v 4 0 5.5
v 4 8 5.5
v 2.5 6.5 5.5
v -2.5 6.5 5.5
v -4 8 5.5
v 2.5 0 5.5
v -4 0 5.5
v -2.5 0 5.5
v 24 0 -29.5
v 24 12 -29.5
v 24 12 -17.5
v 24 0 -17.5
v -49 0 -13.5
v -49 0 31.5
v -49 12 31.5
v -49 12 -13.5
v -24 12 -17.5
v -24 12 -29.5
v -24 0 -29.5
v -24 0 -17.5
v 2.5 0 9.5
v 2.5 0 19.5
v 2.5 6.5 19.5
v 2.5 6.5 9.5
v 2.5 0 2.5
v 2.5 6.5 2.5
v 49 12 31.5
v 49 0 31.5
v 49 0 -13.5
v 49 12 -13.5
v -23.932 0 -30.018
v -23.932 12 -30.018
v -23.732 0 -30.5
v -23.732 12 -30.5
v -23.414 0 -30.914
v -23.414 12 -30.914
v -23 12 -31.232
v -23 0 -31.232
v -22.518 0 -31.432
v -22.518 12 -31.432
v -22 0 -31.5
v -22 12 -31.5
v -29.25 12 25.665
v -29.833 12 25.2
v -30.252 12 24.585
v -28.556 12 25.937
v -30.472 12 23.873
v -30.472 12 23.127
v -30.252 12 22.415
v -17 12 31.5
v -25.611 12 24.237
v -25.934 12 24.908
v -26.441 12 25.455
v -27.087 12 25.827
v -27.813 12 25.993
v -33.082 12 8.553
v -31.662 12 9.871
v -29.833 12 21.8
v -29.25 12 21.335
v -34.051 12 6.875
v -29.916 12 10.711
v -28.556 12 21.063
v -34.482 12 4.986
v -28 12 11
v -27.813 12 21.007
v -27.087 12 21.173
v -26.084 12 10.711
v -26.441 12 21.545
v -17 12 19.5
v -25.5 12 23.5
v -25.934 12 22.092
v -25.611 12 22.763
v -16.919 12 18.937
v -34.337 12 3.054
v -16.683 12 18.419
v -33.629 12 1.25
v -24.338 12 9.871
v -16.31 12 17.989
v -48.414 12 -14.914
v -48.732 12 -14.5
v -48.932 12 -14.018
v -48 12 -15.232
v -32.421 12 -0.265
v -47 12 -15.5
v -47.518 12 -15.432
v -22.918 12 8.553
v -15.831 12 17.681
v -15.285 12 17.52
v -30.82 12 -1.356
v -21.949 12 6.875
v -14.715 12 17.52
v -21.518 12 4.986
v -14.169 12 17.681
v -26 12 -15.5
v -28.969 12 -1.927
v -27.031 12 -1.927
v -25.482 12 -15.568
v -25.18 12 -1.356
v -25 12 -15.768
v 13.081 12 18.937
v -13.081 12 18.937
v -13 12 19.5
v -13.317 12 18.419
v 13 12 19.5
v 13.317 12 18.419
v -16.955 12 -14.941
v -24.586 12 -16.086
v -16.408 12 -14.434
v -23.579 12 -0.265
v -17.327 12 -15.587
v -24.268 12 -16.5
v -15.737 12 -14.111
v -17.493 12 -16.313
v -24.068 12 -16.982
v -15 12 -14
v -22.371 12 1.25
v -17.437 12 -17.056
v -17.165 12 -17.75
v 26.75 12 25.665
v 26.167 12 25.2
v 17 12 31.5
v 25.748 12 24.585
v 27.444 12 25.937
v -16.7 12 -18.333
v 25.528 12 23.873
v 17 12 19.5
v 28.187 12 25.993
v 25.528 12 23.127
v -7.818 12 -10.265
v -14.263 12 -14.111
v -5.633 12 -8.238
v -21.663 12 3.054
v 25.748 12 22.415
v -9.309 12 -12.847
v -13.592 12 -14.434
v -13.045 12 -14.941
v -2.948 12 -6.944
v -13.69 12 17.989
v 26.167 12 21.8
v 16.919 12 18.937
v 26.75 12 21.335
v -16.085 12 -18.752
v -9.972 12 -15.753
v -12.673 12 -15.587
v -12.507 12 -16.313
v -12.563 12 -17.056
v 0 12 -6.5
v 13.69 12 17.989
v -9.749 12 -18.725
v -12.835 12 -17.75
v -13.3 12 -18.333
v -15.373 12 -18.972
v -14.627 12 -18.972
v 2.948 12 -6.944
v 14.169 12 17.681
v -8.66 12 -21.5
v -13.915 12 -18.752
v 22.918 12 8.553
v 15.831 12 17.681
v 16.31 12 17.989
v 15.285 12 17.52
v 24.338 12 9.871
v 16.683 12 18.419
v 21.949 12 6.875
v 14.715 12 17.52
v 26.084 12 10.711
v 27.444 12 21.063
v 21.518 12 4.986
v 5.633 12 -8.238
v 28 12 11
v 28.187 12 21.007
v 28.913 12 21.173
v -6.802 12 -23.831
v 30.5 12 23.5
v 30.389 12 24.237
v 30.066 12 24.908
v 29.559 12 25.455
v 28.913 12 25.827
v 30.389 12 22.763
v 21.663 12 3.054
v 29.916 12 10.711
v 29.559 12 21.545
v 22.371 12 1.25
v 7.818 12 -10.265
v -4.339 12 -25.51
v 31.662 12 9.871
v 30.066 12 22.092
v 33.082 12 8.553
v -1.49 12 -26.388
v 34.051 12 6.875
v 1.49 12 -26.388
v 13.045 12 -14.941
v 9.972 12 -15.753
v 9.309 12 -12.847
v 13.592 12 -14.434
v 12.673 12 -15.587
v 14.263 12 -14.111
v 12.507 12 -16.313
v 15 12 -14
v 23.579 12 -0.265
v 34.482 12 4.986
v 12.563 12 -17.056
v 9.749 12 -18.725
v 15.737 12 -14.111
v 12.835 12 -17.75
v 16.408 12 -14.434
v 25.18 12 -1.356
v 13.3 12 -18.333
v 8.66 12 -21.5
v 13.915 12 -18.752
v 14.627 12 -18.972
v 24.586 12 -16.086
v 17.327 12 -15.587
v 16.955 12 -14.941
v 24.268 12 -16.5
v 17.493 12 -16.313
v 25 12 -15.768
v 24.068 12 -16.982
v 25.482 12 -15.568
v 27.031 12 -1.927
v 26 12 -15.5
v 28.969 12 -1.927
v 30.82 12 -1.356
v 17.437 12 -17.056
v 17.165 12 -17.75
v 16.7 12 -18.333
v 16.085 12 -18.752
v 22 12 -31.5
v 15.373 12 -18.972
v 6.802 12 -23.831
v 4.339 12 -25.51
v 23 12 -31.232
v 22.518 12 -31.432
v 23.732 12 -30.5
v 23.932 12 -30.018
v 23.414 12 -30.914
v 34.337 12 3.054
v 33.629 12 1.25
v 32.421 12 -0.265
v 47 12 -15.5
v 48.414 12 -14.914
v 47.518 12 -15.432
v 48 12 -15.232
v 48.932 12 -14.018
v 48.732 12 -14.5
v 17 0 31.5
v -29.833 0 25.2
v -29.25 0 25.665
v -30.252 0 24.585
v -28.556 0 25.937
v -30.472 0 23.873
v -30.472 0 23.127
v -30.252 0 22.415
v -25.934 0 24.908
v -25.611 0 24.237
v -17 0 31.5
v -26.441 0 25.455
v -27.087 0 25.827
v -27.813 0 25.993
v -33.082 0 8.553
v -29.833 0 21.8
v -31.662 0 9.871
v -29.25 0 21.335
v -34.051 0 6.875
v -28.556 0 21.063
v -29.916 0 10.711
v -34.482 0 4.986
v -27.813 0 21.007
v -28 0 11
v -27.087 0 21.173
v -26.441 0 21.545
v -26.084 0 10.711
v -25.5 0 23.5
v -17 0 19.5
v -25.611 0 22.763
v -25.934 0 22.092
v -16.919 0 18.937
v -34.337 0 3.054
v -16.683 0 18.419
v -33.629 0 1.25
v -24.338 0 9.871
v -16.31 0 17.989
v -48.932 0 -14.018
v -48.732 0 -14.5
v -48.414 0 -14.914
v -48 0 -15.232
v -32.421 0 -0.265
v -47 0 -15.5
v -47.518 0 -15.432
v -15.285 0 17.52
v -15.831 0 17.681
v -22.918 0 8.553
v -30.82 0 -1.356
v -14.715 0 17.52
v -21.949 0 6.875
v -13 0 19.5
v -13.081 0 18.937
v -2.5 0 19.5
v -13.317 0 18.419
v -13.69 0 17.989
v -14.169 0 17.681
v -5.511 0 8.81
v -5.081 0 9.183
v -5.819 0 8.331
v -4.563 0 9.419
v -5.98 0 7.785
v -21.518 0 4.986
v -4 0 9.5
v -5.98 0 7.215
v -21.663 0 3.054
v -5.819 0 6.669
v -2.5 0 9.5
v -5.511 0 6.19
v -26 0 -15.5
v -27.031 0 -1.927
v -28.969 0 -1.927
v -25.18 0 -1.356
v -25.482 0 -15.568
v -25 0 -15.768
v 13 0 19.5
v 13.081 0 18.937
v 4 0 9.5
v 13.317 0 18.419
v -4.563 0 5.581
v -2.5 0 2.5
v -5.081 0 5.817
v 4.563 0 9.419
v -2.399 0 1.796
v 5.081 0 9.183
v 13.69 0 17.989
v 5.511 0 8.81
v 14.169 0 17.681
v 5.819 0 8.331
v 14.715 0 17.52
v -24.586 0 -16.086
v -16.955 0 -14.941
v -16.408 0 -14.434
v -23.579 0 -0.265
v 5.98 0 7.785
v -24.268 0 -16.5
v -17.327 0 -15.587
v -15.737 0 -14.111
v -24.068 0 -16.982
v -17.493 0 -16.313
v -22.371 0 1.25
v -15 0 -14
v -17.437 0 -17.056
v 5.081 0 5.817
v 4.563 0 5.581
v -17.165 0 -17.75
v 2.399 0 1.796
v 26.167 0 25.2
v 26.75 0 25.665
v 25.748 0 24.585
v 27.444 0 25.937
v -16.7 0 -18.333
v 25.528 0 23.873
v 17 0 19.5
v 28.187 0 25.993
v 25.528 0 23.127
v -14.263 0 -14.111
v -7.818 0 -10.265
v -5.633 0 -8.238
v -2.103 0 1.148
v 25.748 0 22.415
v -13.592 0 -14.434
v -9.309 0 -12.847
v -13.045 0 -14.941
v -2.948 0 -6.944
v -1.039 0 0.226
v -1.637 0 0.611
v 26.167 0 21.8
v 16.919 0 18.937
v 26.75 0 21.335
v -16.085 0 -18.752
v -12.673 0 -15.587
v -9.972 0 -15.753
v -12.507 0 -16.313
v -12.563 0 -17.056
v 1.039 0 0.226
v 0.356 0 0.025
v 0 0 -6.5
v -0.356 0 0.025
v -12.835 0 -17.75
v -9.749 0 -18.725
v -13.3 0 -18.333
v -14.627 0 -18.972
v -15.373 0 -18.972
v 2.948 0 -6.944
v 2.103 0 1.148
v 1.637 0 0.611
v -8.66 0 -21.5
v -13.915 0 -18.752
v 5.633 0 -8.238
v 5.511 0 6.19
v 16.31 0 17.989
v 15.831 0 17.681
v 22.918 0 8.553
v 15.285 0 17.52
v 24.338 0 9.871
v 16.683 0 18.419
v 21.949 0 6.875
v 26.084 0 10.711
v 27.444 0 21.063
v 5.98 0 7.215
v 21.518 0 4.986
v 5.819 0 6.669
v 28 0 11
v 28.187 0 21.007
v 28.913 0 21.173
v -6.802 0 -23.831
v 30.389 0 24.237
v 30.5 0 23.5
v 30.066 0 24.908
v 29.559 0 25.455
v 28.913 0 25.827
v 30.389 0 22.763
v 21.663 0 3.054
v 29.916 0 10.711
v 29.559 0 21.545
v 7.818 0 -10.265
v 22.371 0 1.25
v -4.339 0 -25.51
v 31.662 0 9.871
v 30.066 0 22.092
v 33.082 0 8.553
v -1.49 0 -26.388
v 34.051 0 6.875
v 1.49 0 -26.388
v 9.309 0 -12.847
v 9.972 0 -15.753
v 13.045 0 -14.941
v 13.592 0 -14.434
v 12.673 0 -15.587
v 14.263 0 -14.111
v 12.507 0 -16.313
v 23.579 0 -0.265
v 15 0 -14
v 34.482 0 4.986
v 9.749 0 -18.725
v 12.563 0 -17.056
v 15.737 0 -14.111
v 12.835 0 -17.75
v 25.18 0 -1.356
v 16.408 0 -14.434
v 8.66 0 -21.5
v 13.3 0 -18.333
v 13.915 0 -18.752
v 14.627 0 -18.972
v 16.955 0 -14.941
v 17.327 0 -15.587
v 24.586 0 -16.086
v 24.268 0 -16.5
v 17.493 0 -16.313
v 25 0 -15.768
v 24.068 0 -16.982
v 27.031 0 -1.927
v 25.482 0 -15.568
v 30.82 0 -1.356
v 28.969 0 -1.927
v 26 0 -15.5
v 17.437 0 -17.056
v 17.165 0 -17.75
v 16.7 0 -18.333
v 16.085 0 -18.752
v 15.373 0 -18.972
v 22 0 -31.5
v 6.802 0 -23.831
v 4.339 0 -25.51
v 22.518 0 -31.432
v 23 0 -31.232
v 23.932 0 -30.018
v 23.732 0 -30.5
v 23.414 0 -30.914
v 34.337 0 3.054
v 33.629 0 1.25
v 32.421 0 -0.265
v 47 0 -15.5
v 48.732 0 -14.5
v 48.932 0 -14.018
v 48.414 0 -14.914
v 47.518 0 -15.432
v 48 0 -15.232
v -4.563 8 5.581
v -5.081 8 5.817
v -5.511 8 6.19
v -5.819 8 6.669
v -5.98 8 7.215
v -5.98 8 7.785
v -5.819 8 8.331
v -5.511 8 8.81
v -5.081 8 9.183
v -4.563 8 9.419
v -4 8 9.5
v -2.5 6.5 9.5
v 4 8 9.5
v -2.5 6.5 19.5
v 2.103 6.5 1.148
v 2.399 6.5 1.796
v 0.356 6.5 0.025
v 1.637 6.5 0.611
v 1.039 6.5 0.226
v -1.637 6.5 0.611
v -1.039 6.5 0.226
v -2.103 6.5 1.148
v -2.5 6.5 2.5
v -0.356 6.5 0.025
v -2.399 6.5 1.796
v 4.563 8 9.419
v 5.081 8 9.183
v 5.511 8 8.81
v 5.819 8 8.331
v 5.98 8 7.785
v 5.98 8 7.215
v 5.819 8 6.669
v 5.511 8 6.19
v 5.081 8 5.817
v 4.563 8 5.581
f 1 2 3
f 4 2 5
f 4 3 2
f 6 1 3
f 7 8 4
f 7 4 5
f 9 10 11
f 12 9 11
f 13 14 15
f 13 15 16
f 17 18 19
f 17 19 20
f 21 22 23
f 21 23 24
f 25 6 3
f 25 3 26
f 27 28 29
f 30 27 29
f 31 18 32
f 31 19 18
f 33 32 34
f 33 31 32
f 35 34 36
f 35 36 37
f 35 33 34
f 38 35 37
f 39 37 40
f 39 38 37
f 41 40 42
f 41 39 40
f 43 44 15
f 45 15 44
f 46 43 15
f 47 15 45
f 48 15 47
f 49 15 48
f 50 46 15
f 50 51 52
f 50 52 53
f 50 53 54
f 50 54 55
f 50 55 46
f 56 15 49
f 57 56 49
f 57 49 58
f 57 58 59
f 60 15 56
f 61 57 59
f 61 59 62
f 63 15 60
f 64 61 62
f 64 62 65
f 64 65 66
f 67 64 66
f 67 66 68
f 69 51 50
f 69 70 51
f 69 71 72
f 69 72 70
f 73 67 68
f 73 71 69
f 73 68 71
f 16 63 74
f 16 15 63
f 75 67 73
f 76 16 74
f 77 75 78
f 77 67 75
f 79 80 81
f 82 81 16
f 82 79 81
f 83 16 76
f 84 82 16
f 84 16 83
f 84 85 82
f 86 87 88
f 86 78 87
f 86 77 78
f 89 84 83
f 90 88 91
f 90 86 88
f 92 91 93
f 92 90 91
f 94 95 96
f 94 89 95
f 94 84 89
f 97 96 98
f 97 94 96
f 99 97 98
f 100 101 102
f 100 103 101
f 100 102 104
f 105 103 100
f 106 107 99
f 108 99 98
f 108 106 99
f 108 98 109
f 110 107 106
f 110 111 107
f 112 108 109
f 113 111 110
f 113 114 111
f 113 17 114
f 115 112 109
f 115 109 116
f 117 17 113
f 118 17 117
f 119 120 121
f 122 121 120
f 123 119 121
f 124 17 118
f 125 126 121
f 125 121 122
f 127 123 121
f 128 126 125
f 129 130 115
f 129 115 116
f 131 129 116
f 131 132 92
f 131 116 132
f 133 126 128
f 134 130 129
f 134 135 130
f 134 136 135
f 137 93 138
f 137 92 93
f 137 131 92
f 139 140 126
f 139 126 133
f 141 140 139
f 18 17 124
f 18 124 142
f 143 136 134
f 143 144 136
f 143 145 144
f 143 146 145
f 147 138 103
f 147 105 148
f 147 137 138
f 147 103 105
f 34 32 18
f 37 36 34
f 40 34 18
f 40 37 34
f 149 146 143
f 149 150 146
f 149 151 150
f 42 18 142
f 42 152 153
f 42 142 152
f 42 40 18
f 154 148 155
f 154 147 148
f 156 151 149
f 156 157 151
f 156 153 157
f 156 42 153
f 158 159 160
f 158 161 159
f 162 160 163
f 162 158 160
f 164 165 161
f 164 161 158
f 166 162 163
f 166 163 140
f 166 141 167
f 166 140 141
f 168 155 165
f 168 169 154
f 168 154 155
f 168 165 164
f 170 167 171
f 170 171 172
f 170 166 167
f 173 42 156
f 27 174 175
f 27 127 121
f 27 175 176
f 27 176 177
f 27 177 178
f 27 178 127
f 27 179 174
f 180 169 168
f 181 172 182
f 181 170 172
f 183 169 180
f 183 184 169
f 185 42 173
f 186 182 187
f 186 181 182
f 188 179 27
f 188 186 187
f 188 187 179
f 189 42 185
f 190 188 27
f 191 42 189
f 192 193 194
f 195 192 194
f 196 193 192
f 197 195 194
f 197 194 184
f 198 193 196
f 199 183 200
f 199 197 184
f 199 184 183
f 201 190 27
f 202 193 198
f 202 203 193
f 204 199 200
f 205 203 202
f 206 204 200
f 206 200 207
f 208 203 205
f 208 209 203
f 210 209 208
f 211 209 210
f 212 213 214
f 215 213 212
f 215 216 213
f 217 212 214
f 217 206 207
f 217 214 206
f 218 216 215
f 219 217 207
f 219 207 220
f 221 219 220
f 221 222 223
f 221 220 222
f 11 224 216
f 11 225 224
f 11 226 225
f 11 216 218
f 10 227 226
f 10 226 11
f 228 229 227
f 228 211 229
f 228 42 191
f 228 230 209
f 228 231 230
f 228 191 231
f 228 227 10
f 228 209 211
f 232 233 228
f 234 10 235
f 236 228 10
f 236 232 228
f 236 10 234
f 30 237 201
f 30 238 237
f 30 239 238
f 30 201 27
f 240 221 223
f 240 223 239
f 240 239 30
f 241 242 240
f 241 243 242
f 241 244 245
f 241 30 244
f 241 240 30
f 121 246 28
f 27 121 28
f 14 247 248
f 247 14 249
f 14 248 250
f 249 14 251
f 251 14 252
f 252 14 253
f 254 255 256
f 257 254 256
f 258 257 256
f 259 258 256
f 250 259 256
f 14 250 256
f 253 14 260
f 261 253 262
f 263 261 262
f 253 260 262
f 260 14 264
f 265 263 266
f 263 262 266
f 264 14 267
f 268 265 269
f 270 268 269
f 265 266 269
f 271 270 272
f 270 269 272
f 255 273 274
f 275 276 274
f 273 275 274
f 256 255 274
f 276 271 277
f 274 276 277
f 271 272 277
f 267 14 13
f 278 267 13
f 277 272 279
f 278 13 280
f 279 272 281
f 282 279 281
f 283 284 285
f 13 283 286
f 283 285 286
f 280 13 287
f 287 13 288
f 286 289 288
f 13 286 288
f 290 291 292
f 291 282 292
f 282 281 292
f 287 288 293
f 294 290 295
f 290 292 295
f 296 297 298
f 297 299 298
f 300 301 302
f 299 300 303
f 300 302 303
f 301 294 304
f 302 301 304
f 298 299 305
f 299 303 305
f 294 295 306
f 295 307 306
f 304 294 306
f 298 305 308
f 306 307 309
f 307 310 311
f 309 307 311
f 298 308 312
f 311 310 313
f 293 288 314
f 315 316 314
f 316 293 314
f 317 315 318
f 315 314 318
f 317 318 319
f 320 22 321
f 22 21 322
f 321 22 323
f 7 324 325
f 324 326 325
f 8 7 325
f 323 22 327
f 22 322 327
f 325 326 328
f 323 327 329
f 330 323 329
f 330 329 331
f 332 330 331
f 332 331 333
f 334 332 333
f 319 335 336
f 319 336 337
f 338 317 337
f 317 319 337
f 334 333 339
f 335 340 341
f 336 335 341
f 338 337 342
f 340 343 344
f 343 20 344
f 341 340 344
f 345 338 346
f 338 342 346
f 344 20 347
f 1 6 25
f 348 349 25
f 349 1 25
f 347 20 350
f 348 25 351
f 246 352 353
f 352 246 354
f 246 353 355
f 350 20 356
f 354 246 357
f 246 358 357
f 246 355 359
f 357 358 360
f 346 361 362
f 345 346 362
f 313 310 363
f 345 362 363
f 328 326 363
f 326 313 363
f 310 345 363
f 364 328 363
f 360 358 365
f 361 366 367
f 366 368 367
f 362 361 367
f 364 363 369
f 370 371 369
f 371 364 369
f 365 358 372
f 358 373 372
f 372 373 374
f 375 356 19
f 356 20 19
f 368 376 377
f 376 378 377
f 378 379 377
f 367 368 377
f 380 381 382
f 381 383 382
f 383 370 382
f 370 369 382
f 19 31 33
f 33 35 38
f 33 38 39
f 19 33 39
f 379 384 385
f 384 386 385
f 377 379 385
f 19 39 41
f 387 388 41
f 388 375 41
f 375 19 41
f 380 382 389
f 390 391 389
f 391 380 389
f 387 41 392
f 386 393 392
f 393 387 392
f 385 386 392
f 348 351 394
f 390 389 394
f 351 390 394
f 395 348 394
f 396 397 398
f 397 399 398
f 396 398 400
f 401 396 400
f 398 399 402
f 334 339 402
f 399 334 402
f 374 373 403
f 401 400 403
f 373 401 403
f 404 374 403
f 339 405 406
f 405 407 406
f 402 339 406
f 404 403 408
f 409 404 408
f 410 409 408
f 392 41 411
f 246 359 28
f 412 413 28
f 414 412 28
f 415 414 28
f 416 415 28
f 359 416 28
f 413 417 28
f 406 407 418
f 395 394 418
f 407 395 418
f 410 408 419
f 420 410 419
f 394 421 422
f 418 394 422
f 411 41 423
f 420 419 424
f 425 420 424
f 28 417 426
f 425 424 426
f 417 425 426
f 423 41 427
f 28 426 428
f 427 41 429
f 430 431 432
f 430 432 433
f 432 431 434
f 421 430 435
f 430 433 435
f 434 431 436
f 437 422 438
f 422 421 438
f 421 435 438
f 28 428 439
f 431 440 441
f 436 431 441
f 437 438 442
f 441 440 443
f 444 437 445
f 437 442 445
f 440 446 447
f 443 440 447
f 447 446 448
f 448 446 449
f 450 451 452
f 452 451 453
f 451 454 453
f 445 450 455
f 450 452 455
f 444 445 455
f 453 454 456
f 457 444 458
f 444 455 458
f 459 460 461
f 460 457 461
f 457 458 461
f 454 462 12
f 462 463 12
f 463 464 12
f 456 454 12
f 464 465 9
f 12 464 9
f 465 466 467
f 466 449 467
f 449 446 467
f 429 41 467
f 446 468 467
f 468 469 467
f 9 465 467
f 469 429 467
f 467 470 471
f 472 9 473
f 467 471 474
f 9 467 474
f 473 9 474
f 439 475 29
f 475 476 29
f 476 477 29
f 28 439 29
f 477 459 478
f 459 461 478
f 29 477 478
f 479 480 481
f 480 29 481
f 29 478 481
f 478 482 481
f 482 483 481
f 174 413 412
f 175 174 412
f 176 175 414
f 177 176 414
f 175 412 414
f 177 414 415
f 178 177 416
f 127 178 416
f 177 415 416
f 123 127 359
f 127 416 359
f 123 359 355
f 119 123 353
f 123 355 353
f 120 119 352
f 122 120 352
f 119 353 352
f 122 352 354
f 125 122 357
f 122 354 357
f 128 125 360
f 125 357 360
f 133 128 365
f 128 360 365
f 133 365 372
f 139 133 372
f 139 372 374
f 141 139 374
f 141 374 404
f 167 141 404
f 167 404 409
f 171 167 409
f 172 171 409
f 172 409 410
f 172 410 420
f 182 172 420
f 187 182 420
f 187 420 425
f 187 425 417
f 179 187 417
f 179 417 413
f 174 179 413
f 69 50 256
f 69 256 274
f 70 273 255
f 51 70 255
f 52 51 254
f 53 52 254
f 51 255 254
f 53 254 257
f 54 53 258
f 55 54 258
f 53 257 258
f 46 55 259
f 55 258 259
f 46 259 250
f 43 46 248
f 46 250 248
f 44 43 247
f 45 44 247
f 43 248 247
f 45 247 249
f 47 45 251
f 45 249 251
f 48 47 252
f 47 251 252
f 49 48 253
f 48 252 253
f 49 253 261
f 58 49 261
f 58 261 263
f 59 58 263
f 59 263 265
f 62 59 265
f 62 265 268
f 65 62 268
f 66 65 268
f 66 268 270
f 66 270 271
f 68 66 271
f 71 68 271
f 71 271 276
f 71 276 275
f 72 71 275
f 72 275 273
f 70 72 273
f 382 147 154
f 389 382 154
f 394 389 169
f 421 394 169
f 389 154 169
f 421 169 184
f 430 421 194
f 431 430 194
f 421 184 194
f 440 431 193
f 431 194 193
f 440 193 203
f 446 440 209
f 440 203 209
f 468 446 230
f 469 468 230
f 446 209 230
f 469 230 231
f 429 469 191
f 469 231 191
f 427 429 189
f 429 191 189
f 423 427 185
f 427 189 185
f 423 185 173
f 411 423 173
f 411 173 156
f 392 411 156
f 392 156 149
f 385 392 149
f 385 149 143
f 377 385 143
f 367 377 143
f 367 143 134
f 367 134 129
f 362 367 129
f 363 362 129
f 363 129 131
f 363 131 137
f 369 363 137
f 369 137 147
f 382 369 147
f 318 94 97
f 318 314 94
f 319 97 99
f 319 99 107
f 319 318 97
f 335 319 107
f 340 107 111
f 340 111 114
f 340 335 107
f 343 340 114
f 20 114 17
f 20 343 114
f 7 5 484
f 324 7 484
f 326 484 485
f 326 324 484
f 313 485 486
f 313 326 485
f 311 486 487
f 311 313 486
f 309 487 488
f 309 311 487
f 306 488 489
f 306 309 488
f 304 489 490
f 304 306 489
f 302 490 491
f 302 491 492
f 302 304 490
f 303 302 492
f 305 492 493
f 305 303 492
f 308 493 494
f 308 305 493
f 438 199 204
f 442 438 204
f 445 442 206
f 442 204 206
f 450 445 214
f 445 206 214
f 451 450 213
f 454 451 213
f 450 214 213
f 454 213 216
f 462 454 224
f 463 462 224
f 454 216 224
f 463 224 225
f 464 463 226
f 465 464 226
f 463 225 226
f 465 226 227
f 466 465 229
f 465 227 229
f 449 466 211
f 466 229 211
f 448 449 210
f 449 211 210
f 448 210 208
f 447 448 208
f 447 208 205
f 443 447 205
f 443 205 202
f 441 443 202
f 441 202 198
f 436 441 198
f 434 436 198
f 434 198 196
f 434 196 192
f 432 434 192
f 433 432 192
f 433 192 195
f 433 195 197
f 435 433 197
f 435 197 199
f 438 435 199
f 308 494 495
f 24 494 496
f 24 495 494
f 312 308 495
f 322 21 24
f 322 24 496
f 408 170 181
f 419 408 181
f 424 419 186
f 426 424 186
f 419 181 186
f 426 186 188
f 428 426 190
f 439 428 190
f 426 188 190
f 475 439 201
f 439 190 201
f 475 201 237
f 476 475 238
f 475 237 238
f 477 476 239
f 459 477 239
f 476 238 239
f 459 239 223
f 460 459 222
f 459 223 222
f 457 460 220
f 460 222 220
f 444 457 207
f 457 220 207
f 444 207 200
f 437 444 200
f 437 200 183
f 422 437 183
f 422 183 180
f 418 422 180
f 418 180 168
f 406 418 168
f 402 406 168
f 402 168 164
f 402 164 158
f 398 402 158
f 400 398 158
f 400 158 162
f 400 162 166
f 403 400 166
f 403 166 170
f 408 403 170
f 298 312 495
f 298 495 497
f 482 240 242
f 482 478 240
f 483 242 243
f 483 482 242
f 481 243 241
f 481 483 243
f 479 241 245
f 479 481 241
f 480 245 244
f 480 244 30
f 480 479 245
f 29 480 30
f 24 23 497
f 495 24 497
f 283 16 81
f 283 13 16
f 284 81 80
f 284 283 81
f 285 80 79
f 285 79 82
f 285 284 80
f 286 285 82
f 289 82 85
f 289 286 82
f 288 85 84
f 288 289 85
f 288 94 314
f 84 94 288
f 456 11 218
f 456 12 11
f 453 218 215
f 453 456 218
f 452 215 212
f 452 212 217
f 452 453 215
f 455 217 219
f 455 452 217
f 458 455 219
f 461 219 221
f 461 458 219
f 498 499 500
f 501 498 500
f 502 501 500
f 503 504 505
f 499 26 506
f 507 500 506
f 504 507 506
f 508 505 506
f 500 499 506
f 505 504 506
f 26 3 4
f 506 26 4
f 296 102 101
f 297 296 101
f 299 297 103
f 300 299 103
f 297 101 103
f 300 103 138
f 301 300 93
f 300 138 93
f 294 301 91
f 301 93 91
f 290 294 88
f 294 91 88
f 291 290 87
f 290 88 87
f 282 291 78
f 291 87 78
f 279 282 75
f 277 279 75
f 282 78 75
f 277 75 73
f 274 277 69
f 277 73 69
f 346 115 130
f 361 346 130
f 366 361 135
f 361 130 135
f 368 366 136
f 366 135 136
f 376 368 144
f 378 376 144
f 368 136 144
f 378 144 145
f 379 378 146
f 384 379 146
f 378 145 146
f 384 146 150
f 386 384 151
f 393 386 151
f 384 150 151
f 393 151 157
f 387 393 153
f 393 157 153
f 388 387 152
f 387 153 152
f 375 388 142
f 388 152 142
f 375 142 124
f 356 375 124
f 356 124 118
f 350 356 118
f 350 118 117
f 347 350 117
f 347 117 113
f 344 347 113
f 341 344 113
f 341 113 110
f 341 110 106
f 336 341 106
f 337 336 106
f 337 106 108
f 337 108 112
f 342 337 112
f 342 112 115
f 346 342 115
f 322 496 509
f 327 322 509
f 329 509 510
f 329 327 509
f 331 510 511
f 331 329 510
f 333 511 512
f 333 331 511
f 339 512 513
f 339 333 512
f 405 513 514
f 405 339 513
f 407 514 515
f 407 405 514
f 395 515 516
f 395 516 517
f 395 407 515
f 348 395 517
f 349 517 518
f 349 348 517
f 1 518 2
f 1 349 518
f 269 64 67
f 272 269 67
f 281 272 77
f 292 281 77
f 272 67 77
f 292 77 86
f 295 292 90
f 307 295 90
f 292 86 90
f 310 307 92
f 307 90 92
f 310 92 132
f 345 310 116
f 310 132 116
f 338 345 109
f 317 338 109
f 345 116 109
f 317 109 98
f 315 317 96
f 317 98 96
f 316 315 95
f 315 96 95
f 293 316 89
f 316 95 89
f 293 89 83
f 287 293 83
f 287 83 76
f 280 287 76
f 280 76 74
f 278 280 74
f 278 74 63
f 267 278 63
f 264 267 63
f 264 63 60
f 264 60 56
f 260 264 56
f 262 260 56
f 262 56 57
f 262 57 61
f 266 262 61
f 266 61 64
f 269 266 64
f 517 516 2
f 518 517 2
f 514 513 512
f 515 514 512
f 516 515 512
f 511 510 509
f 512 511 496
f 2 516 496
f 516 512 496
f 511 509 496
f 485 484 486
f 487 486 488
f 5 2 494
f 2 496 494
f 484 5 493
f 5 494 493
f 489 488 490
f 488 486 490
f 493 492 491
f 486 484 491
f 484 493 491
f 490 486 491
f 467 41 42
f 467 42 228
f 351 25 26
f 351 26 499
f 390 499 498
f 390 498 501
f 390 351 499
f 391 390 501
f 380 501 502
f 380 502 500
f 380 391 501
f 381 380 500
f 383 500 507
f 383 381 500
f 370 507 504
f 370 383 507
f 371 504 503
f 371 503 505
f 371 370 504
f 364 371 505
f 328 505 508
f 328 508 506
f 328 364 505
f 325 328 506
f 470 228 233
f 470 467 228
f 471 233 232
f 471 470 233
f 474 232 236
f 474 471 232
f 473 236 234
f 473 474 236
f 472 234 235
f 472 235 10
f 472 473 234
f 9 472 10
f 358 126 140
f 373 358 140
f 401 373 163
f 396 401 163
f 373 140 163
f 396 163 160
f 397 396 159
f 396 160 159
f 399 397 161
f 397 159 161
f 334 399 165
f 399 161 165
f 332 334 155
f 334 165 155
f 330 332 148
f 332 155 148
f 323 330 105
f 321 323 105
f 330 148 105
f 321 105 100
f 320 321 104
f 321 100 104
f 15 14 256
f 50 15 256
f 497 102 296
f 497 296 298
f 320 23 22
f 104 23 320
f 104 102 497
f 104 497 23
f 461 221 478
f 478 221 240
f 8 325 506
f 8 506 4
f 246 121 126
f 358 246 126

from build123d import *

# Parameters (mm, degrees)
SKETCH1_W                = 98
SKETCH1_H                = 63
BOSS_EXTRUDE1_DEPTH      = 12
CUT_EXTRUDE1_REACH       = 61.475
SKETCH2_R                = 10
SKETCH2_R_2              = 6.5
SKETCH2_R_3              = 2.5
CUT_EXTRUDE2_REACH       = 61.475
SKETCH3_W                = 34
SKETCH3_H                = 12
F_5_0_5_DIAMETER_HOLE1_D = 5
CUT_EXTRUDE3_REACH       = 61.475
SKETCH11_W               = 25
SKETCH11_H               = 16
CUT_EXTRUDE4_REACH       = 61.475
FILLET1_R                = 2
CUT_EXTRUDE7_DEPTH       = 8
CUT_EXTRUDE8_DEPTH       = 6.5


with BuildPart() as part:
    # Sketch1 → Boss-Extrude1 (new body)
    with BuildSketch(Plane(origin=(0, 0, 0), x_dir=(1, 0, 0), z_dir=(0, 1, 0))):
        Rectangle(SKETCH1_W, SKETCH1_H)
    extrude(amount=BOSS_EXTRUDE1_DEPTH)

    # Sketch2 → Cut-Extrude1 (cut, up to next)
    with BuildSketch(Plane(origin=(0, 12, 0), x_dir=(1, 0, 0), z_dir=(0, 1, 0)), mode=Mode.PRIVATE) as cut_extrude1_sk1:
        with Locations(Location((0, 16.5, 0), (0, 0, 270))):
            Circle(SKETCH2_R)
    cut_extrude1_tool1 = extrude(cut_extrude1_sk1.sketch, amount=-CUT_EXTRUDE1_REACH, mode=Mode.PRIVATE) & part.part
    # Sketch2 → Cut-Extrude1 (cut, up to next)
    with BuildSketch(Plane(origin=(0, 12, 0), x_dir=(1, 0, 0), z_dir=(0, 1, 0)), mode=Mode.PRIVATE) as cut_extrude1_sk2:
        with Locations(Location((-28, -4.5, 0), (0, 0, 270))):
            Circle(SKETCH2_R_2)
    cut_extrude1_tool2 = extrude(cut_extrude1_sk2.sketch, amount=-CUT_EXTRUDE1_REACH, mode=Mode.PRIVATE) & part.part
    # Sketch2 → Cut-Extrude1 (cut, up to next)
    with BuildSketch(Plane(origin=(0, 12, 0), x_dir=(1, 0, 0), z_dir=(0, 1, 0)), mode=Mode.PRIVATE) as cut_extrude1_sk3:
        with Locations(Location((28, -4.5, 0), (0, 0, 270))):
            Circle(SKETCH2_R_2)
    cut_extrude1_tool3 = extrude(cut_extrude1_sk3.sketch, amount=-CUT_EXTRUDE1_REACH, mode=Mode.PRIVATE) & part.part
    # Sketch2 → Cut-Extrude1 (cut, up to next)
    with BuildSketch(Plane(origin=(0, 12, 0), x_dir=(1, 0, 0), z_dir=(0, 1, 0)), mode=Mode.PRIVATE) as cut_extrude1_sk4:
        with Locations(Location((-15, 16.5, 0), (0, 0, 270))):
            Circle(SKETCH2_R_3)
    cut_extrude1_tool4 = extrude(cut_extrude1_sk4.sketch, amount=-CUT_EXTRUDE1_REACH, mode=Mode.PRIVATE) & part.part
    # Sketch2 → Cut-Extrude1 (cut, up to next)
    with BuildSketch(Plane(origin=(0, 12, 0), x_dir=(1, 0, 0), z_dir=(0, 1, 0)), mode=Mode.PRIVATE) as cut_extrude1_sk5:
        with Locations(Location((15, 16.5, 0), (0, 0, 270))):
            Circle(SKETCH2_R_3)
    cut_extrude1_tool5 = extrude(cut_extrude1_sk5.sketch, amount=-CUT_EXTRUDE1_REACH, mode=Mode.PRIVATE) & part.part
    add(cut_extrude1_tool1.solids().sort_by_distance((0, 12, -16.5))[0], mode=Mode.SUBTRACT)
    add(cut_extrude1_tool2.solids().sort_by_distance((-28, 12, 4.5))[0], mode=Mode.SUBTRACT)
    add(cut_extrude1_tool3.solids().sort_by_distance((28, 12, 4.5))[0], mode=Mode.SUBTRACT)
    add(cut_extrude1_tool4.solids().sort_by_distance((-15, 12, -16.5))[0], mode=Mode.SUBTRACT)
    add(cut_extrude1_tool5.solids().sort_by_distance((15, 12, -16.5))[0], mode=Mode.SUBTRACT)

    # Sketch3 → Cut-Extrude2 (cut, up to next)
    with BuildSketch(Plane(origin=(0, 12, 0), x_dir=(1, 0, 0), z_dir=(0, 1, 0)), mode=Mode.PRIVATE) as cut_extrude2_sk1:
        with Locations((0, -25.5)):
            Rectangle(SKETCH3_W, SKETCH3_H)
    cut_extrude2_tool1 = extrude(cut_extrude2_sk1.sketch, amount=-CUT_EXTRUDE2_REACH, mode=Mode.PRIVATE) & part.part
    add(cut_extrude2_tool1.solids().sort_by_distance((0, 12, 25.5))[0], mode=Mode.SUBTRACT)

    # Ø5.0 (5) Diameter Hole1 (through all)
    with Locations(Plane(origin=(0, 12, 0), x_dir=(-1, 0, 0), z_dir=(0, 1, 0))):
        with Locations((28, 23.5), (-28, 23.5)):
            Hole(F_5_0_5_DIAMETER_HOLE1_D / 2)

    # Sketch11 → Cut-Extrude3 (cut, up to next)
    with BuildSketch(Plane(origin=(0, 12, 0), x_dir=(-1, 0, 0), z_dir=(0, 1, 0)), mode=Mode.PRIVATE) as cut_extrude3_sk1:
        with Locations((36.5, -23.5)):
            Rectangle(SKETCH11_W, SKETCH11_H)
    cut_extrude3_tool1 = extrude(cut_extrude3_sk1.sketch, amount=-CUT_EXTRUDE3_REACH, mode=Mode.PRIVATE) & part.part
    cut_extrude3 = cut_extrude3_tool1.solids().sort_by_distance((-36.5, 12, -23.5))[0]
    add(cut_extrude3, mode=Mode.SUBTRACT)

    # Mirror1: Cut-Extrude3 across plane
    add(cut_extrude3.mirror(Plane(origin=(0, 0, 0), x_dir=(0, 0, 1), z_dir=(1, 0, 0))), mode=Mode.SUBTRACT)

    # Sketch12 → Cut-Extrude4 (cut, up to next)
    with BuildSketch(Plane(origin=(0, 12, 0), x_dir=(1, 0, 0), z_dir=(0, 1, 0)), mode=Mode.PRIVATE) as cut_extrude4_sk1:
        with BuildLine():
            Line((-17, -19.5), (-13, -19.5))
            ThreePointArc((-13, -19.5), (-15, -17.5), (-17, -19.5))
        make_face()
    cut_extrude4_tool1 = extrude(cut_extrude4_sk1.sketch, amount=-CUT_EXTRUDE4_REACH, mode=Mode.PRIVATE) & part.part
    # Sketch12 → Cut-Extrude4 (cut, up to next)
    with BuildSketch(Plane(origin=(0, 12, 0), x_dir=(1, 0, 0), z_dir=(0, 1, 0)), mode=Mode.PRIVATE) as cut_extrude4_sk2:
        with BuildLine():
            Line((13, -19.5), (17, -19.5))
            ThreePointArc((17, -19.5), (15, -17.5), (13, -19.5))
        make_face()
    cut_extrude4_tool2 = extrude(cut_extrude4_sk2.sketch, amount=-CUT_EXTRUDE4_REACH, mode=Mode.PRIVATE) & part.part
    add(cut_extrude4_tool1.solids().sort_by_distance((-15, 12, 18.651174))[0], mode=Mode.SUBTRACT)
    add(cut_extrude4_tool2.solids().sort_by_distance((15, 12, 18.651174))[0], mode=Mode.SUBTRACT)

    # Fillet1
    fillet1_edges = [part.edges().sort_by_distance(p)[0] for p in [
        (-49, 6, -15.5),
        (-24, 6, -31.5),
        (-24, 6, -15.5),
        (49, 6, -15.5),
        (24, 6, -15.5),
        (24, 6, -31.5),
    ]]
    fillet(fillet1_edges, radius=FILLET1_R)

    # Sketch18 → Cut-Extrude7 (cut)
    with BuildSketch(Plane(origin=(-30.447133355, 0, 87.682451642), x_dir=(1, 0, 0), z_dir=(0, -1, 0))):
        with BuildLine():
            Line((26.447133355, -78.182451642), (34.447133355, -78.182451642))
            ThreePointArc((34.447133355, -78.182451642), (36.447133355, -80.182451642), (34.447133355, -82.182451642))
            Line((34.447133355, -82.182451642), (26.447133355, -82.182451642))
            ThreePointArc((26.447133355, -82.182451642), (24.447133355, -80.182451642), (26.447133355, -78.182451642))
        make_face()
    extrude(amount=-CUT_EXTRUDE7_DEPTH, mode=Mode.SUBTRACT)

    # Sketch20 → Cut-Extrude8 (cut)
    with BuildSketch(Plane(origin=(-30.447133355, 0, 87.682451642), x_dir=(1, 0, 0), z_dir=(0, -1, 0))):
        with BuildLine():
            Line((32.947133355, -47.95431377), (32.947133355, -85.182451642))
            ThreePointArc((32.947133355, -85.182451642), (30.447133355, -87.682451642), (27.947133355, -85.182451642))
            Line((27.947133355, -85.182451642), (27.947133355, -47.95431377))
            ThreePointArc((27.947133355, -47.95431377), (30.447133355, -45.45431377), (32.947133355, -47.95431377))
        make_face()
    extrude(amount=-CUT_EXTRUDE8_DEPTH, mode=Mode.SUBTRACT)


solid = part.part
